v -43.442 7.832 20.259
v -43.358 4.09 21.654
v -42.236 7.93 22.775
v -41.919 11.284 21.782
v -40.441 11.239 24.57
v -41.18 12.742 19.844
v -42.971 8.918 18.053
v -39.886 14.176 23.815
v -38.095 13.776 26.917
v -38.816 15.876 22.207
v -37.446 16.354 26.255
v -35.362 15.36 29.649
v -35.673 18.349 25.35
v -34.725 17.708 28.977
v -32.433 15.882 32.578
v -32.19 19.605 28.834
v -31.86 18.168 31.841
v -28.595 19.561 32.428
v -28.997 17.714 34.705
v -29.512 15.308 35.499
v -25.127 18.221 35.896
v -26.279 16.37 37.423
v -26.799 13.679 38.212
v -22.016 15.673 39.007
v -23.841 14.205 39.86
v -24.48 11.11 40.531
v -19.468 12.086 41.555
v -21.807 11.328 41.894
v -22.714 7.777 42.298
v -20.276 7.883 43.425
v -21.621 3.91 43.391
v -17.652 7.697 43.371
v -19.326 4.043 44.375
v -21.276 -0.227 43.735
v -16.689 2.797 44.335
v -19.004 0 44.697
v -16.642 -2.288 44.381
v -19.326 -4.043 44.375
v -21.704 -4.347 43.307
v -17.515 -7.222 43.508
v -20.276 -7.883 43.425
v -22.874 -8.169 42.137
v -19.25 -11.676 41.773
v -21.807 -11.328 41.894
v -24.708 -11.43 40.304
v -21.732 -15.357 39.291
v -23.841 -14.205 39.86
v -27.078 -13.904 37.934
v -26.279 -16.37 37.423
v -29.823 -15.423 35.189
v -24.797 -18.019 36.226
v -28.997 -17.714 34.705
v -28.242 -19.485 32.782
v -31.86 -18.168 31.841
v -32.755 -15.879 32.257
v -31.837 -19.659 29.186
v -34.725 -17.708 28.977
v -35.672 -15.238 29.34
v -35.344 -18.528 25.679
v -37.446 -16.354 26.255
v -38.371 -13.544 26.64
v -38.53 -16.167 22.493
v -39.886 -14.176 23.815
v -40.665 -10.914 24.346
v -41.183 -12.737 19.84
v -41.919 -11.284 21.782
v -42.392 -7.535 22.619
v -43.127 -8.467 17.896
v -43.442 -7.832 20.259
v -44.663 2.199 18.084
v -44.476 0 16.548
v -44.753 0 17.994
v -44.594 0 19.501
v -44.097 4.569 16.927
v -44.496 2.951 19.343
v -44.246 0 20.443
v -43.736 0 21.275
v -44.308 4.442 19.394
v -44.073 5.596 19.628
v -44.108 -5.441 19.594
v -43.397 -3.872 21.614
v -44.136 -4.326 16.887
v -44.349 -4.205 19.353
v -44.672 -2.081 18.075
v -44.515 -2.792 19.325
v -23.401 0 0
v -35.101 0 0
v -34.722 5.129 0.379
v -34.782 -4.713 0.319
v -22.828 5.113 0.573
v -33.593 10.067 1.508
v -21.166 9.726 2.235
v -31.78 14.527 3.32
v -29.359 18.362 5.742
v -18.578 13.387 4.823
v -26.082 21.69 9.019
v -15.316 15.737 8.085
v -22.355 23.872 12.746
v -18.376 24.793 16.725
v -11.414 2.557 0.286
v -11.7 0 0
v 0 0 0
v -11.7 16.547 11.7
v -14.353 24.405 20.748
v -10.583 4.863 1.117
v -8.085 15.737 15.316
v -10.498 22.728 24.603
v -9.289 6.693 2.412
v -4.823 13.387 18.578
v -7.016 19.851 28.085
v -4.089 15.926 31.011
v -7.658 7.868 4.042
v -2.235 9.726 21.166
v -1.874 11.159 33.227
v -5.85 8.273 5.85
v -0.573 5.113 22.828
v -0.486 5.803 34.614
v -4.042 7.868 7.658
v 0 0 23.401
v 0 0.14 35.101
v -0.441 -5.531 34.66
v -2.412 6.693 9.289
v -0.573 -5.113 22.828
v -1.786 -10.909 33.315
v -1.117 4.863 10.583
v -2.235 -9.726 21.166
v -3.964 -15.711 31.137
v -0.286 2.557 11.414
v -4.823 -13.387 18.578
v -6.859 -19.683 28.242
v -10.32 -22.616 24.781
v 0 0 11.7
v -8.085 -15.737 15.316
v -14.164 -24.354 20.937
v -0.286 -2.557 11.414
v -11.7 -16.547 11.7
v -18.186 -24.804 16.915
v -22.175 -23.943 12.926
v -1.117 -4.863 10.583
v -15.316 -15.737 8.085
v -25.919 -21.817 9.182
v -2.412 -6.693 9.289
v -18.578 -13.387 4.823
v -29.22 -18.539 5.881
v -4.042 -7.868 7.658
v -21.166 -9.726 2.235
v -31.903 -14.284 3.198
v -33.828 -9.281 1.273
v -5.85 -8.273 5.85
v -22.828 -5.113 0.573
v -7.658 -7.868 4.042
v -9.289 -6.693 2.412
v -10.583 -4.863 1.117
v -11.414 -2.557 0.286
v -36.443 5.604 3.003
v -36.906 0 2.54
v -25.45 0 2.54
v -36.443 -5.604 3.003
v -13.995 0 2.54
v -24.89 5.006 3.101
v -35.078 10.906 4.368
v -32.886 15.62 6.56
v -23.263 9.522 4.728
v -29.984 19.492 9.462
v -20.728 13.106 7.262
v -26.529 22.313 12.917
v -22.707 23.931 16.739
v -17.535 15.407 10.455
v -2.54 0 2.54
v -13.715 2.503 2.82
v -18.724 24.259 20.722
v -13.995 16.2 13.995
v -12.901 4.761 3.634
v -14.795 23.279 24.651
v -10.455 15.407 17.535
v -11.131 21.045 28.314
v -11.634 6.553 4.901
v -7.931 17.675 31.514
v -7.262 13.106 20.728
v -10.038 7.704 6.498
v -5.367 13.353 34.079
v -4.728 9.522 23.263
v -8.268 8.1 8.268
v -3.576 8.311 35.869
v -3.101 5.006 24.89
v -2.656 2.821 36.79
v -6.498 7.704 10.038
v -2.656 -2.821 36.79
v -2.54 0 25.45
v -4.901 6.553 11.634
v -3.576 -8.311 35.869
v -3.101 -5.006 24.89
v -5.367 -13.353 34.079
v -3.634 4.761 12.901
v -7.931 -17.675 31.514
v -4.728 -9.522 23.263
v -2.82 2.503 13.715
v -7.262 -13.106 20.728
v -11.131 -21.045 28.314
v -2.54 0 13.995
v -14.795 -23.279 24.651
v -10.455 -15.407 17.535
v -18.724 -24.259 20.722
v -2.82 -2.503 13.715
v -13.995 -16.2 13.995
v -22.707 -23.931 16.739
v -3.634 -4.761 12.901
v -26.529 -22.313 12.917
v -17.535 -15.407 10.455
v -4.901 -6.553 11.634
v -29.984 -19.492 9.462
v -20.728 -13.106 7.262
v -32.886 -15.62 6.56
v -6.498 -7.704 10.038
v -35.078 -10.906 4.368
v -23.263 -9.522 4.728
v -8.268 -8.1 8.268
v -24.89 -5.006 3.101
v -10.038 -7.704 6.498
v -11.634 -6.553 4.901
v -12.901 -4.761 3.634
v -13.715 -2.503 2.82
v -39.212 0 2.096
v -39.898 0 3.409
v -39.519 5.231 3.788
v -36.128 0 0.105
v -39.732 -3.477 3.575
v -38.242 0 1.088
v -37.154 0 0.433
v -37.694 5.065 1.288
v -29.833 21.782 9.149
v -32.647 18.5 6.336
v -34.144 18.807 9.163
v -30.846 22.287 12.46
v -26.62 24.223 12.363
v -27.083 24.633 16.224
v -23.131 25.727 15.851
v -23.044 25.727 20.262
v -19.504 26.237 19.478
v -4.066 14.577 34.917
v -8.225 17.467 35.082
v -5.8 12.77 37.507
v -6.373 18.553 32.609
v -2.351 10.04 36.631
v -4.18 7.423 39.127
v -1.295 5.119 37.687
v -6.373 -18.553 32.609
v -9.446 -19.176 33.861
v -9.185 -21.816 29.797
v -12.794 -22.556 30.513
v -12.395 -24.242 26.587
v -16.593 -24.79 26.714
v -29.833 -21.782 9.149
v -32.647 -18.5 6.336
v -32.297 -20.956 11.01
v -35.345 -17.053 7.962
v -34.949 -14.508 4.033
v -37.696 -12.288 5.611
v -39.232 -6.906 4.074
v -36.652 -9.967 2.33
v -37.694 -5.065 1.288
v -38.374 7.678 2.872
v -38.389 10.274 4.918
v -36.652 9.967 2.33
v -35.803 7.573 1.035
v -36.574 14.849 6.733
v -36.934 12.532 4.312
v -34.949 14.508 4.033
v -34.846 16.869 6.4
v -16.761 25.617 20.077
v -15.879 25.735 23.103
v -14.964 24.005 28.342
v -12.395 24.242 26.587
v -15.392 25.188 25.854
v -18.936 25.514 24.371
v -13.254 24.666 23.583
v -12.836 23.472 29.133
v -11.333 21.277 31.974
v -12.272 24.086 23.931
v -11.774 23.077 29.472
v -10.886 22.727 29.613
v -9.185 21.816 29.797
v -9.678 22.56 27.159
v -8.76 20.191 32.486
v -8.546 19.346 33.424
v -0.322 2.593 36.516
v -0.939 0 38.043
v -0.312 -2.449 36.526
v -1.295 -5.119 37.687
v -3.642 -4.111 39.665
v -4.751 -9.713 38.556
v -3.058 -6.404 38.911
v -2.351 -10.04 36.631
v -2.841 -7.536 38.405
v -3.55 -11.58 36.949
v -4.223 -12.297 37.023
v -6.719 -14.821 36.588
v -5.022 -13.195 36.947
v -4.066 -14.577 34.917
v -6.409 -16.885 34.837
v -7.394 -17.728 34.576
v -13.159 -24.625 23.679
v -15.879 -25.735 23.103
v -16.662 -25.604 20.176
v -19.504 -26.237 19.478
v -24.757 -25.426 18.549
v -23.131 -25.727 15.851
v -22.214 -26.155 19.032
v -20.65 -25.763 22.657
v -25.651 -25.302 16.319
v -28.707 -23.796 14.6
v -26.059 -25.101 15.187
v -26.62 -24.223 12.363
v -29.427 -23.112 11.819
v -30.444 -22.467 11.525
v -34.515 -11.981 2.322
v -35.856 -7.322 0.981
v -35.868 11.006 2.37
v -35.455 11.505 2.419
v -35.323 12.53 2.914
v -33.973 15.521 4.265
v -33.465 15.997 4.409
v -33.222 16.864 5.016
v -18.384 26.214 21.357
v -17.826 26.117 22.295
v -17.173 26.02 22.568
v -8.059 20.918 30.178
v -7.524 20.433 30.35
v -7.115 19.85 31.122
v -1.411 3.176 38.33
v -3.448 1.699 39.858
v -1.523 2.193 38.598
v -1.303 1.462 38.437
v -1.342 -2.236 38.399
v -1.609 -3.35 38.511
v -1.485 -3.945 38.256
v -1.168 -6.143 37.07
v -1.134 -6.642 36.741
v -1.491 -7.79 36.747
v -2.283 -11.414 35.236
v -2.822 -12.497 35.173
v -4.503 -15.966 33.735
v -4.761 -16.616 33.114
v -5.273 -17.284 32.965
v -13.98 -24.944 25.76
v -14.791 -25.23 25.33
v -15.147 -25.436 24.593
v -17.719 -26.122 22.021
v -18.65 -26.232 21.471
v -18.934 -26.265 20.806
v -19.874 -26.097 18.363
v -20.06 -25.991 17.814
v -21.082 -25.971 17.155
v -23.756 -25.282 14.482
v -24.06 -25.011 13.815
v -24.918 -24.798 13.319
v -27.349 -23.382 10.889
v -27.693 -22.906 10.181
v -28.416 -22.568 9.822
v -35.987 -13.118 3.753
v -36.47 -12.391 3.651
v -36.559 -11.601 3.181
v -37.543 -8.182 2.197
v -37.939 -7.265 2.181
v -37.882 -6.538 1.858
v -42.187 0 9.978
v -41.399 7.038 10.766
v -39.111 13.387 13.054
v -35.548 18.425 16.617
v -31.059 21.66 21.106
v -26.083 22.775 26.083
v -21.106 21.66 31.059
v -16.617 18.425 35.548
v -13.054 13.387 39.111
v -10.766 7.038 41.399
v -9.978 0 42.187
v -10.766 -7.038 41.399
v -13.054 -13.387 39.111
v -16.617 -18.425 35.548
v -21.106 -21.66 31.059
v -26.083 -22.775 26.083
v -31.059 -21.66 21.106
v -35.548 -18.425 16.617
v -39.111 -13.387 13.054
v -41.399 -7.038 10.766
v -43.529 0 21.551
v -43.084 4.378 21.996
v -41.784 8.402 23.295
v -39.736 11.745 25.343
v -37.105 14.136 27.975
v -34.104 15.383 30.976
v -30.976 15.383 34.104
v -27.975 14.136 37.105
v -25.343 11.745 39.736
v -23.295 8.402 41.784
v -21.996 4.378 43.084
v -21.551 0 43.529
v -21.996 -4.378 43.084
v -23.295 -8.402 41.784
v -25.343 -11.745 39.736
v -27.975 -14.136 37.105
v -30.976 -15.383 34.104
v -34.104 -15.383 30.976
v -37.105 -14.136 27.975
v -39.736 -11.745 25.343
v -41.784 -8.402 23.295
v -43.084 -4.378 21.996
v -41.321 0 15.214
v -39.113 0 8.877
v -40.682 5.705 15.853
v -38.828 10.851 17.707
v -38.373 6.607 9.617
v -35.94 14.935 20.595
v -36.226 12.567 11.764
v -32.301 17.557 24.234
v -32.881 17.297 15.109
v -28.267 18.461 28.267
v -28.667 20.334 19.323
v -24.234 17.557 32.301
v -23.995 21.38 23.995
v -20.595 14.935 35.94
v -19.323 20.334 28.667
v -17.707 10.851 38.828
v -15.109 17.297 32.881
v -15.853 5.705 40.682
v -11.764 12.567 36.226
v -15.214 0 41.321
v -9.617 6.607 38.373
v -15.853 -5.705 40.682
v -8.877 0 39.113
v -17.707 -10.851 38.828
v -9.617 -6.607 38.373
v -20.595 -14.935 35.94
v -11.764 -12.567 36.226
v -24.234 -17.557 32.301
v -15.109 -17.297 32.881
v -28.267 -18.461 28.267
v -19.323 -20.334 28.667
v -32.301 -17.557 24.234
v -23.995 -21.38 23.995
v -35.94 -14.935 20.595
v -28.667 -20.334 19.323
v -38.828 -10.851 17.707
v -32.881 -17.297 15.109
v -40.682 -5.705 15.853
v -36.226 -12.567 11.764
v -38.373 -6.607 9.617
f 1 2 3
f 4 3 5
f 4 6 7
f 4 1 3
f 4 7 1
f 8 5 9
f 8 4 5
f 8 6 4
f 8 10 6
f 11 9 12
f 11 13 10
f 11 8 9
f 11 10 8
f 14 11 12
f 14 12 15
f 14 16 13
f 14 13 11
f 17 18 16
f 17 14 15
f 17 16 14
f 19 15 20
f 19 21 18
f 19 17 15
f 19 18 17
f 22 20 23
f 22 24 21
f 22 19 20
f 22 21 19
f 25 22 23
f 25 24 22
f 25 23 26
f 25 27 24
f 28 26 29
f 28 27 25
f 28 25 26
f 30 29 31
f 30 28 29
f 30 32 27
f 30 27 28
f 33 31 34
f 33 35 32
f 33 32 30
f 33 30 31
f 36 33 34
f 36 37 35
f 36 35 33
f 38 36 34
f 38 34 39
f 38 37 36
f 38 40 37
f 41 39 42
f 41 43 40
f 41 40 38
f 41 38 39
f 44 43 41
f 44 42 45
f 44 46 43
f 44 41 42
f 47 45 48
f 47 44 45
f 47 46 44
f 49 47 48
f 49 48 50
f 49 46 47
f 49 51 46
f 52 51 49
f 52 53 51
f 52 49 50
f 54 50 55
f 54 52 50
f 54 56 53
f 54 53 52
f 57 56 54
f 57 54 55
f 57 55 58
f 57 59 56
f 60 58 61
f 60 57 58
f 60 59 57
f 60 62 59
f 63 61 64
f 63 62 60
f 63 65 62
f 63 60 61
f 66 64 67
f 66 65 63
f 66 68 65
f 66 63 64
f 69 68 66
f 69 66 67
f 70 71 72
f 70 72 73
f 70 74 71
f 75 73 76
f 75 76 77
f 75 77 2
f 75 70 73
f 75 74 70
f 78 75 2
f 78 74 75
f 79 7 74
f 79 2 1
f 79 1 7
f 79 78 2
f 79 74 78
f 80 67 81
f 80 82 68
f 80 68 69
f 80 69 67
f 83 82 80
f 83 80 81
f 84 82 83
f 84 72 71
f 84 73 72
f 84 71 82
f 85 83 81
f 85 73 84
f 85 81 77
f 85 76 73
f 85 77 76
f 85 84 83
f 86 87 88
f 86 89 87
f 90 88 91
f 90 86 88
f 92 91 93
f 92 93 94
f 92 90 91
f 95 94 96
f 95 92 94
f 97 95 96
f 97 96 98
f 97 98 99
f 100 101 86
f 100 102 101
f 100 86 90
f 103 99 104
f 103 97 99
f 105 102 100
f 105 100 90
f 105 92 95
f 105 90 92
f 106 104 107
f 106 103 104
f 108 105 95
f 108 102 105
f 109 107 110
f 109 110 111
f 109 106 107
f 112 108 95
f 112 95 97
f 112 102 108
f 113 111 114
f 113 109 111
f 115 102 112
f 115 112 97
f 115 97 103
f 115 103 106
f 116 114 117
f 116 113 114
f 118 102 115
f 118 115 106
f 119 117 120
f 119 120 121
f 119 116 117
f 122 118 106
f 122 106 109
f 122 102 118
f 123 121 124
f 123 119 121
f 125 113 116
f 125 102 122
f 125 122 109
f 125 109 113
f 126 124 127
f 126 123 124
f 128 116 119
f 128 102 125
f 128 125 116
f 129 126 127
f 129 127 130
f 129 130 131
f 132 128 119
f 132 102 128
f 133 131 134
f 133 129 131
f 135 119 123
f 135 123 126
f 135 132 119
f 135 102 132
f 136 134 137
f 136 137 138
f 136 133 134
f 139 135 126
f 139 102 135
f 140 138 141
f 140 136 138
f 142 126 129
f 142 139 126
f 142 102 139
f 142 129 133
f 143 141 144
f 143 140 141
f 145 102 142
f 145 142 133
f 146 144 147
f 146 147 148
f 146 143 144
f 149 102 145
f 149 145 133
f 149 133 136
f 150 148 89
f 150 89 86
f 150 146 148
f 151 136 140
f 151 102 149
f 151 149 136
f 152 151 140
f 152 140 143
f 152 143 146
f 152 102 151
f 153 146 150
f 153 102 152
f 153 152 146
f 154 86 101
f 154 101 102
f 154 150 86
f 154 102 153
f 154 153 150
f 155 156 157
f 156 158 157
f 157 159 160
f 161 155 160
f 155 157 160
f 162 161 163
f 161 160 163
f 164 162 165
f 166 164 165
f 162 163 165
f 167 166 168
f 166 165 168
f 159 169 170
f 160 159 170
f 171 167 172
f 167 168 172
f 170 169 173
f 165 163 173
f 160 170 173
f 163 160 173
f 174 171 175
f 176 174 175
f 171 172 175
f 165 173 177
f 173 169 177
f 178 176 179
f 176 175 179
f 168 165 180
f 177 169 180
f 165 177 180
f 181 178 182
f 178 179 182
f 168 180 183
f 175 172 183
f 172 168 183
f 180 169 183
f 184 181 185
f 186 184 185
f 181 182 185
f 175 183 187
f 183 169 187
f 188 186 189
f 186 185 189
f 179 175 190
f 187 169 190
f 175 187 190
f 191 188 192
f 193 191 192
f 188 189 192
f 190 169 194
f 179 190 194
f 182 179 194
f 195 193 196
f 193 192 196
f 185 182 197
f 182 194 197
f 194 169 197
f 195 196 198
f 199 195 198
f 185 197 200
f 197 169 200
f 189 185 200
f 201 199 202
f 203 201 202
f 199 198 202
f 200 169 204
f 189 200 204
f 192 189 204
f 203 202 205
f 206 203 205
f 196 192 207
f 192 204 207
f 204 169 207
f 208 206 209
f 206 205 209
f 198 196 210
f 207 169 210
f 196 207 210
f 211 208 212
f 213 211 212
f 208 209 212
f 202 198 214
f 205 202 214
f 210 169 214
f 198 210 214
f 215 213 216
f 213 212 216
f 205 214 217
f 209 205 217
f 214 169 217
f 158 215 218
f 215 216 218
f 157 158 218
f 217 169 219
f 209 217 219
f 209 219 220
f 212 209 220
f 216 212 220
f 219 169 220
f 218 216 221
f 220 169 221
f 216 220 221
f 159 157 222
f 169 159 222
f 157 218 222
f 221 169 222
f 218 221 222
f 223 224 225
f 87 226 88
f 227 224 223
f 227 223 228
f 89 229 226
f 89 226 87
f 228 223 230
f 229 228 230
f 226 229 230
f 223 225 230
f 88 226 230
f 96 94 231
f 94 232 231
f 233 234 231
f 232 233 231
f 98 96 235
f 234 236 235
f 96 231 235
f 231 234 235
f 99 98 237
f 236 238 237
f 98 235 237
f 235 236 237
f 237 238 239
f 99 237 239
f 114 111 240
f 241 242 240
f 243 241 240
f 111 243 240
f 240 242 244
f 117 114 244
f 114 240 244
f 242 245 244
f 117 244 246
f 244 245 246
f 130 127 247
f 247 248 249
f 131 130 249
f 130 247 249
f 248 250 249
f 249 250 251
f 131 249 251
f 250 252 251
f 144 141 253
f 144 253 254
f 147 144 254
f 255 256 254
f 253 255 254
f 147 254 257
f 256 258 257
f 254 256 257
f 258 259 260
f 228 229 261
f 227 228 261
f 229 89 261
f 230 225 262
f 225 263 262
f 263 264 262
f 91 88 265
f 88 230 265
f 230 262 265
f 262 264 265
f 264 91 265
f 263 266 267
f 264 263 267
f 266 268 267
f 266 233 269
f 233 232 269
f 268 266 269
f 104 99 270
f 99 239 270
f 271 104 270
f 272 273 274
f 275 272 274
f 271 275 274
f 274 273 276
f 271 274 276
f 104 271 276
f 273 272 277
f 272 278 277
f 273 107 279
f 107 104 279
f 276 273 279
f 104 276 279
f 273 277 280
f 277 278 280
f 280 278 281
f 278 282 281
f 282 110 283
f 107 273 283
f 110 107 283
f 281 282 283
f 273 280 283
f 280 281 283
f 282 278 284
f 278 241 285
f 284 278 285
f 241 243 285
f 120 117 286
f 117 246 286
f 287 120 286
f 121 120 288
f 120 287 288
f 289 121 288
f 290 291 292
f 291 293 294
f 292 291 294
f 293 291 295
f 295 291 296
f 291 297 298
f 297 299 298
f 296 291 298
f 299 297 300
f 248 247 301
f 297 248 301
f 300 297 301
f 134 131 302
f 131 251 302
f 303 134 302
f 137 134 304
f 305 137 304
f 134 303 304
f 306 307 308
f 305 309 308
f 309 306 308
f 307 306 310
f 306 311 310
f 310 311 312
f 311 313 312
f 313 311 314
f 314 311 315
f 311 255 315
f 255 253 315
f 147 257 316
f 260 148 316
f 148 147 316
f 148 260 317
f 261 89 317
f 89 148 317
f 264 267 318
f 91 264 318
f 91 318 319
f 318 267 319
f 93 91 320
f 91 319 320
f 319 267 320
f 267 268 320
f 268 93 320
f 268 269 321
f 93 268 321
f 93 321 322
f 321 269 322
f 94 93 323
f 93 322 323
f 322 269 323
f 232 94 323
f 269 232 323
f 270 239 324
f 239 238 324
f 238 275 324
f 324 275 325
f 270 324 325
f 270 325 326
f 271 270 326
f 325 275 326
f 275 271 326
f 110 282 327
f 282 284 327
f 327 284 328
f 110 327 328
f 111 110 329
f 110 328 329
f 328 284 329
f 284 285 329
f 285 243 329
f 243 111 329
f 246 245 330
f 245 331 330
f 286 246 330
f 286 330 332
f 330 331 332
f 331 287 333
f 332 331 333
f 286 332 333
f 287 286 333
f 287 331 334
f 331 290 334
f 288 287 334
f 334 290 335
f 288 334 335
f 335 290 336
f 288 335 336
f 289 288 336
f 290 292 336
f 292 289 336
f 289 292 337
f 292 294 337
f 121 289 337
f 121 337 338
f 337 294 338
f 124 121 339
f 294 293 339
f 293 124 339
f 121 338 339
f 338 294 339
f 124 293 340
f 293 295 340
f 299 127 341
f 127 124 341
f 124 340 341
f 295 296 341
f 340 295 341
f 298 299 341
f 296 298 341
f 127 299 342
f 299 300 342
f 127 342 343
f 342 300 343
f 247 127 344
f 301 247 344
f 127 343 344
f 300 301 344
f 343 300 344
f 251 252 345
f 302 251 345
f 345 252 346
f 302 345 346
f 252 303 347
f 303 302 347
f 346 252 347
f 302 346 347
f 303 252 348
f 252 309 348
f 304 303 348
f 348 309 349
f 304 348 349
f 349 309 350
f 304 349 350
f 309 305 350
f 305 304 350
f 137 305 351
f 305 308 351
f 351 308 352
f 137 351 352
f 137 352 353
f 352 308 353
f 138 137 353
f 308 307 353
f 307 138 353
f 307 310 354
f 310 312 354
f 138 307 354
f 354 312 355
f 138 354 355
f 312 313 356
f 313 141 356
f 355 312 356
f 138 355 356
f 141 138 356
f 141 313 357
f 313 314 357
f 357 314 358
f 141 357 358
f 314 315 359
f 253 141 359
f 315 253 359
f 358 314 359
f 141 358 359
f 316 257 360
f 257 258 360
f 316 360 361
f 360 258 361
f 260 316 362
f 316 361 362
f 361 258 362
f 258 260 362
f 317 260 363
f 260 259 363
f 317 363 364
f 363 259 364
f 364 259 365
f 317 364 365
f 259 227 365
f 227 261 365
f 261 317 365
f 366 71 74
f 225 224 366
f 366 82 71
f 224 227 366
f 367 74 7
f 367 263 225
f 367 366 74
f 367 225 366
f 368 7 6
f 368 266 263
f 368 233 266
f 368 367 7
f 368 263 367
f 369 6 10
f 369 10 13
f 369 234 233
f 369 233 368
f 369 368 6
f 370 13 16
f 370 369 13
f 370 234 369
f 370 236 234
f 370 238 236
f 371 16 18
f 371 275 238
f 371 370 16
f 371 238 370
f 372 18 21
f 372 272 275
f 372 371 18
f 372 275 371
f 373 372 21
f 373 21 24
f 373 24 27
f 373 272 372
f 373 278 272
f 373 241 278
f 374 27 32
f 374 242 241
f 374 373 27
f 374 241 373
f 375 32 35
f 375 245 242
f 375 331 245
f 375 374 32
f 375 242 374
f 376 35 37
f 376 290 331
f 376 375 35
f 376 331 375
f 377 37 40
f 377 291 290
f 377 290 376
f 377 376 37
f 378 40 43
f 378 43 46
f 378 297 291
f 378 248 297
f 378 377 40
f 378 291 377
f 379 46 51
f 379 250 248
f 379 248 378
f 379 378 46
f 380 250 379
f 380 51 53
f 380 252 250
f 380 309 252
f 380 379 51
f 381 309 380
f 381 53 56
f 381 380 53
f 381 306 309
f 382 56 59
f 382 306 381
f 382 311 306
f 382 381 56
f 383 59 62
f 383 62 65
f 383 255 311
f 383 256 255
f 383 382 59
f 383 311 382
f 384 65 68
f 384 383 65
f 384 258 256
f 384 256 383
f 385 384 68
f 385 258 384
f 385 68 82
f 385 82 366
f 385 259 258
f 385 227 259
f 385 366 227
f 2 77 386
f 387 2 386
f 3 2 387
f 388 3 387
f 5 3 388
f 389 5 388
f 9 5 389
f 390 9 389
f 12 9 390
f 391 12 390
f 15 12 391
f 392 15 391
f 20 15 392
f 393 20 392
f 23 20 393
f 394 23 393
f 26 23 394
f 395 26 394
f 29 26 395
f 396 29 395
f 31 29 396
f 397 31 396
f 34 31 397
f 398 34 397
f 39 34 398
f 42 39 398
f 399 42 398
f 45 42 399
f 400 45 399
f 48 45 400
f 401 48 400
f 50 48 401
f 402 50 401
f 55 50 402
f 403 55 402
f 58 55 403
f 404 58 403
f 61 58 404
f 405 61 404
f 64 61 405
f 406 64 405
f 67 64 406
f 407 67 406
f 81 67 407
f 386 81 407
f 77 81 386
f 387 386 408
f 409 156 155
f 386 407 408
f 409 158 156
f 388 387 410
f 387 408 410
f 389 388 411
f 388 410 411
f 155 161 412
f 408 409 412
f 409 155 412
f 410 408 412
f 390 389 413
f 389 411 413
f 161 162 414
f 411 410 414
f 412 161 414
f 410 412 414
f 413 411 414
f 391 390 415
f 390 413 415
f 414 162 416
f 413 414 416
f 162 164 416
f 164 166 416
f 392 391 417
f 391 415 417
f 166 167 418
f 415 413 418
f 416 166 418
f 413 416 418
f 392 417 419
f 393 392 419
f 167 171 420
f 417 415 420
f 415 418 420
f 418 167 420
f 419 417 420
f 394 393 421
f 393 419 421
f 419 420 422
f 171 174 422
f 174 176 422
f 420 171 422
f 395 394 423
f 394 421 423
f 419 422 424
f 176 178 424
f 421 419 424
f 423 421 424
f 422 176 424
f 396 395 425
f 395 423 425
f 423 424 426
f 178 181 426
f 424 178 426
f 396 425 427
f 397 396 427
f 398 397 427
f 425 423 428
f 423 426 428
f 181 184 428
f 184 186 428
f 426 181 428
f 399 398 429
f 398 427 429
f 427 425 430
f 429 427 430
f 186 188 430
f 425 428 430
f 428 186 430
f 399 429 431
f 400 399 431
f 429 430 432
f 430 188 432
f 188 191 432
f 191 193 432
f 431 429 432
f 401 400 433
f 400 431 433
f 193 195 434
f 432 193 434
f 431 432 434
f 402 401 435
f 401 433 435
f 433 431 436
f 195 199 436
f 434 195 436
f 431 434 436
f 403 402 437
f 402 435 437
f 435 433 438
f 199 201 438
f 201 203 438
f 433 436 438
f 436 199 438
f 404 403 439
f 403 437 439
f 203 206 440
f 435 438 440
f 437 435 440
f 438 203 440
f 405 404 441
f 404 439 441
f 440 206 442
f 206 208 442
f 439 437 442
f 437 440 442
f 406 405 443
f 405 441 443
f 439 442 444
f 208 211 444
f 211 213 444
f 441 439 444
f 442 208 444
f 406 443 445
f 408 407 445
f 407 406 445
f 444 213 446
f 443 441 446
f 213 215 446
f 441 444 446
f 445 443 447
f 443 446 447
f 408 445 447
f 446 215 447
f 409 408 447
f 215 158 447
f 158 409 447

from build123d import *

# Parameters (mm, degrees)
F2_T = -2.54
F3_R = 5.08
F4_R = 5.08


with BuildPart() as f1:
    # F0 (on Front) → F1 (revolve)
    with BuildSketch(Plane.XZ):
        Polygon((-38.710538, 0), (0, 0), (-34.087466, 34.087466), (-45.367766, 19.108707), align=None)
    revolve(axis=Axis((-17.043733, 0, 17.043733), (0.707107, 0, -0.707107)))

    # F2
    f2_openings = [f1.faces().sort_by_distance(p)[0] for p in [
        (-26.598087, 0, 39.727616),
    ]]
    offset(amount=F2_T, openings=f2_openings)

    # F3
    f3_edges = [f1.edges().sort_by_distance(p)[0] for p in [
        (-19.108707, 0, 45.367766),
    ]]
    fillet(f3_edges, radius=F3_R)

    # F4
    f4_edges = [f1.edges().sort_by_distance(p)[0] for p in [
        (0, 0, 38.710538),
    ]]
    fillet(f4_edges, radius=F4_R)


solid = f1.part
